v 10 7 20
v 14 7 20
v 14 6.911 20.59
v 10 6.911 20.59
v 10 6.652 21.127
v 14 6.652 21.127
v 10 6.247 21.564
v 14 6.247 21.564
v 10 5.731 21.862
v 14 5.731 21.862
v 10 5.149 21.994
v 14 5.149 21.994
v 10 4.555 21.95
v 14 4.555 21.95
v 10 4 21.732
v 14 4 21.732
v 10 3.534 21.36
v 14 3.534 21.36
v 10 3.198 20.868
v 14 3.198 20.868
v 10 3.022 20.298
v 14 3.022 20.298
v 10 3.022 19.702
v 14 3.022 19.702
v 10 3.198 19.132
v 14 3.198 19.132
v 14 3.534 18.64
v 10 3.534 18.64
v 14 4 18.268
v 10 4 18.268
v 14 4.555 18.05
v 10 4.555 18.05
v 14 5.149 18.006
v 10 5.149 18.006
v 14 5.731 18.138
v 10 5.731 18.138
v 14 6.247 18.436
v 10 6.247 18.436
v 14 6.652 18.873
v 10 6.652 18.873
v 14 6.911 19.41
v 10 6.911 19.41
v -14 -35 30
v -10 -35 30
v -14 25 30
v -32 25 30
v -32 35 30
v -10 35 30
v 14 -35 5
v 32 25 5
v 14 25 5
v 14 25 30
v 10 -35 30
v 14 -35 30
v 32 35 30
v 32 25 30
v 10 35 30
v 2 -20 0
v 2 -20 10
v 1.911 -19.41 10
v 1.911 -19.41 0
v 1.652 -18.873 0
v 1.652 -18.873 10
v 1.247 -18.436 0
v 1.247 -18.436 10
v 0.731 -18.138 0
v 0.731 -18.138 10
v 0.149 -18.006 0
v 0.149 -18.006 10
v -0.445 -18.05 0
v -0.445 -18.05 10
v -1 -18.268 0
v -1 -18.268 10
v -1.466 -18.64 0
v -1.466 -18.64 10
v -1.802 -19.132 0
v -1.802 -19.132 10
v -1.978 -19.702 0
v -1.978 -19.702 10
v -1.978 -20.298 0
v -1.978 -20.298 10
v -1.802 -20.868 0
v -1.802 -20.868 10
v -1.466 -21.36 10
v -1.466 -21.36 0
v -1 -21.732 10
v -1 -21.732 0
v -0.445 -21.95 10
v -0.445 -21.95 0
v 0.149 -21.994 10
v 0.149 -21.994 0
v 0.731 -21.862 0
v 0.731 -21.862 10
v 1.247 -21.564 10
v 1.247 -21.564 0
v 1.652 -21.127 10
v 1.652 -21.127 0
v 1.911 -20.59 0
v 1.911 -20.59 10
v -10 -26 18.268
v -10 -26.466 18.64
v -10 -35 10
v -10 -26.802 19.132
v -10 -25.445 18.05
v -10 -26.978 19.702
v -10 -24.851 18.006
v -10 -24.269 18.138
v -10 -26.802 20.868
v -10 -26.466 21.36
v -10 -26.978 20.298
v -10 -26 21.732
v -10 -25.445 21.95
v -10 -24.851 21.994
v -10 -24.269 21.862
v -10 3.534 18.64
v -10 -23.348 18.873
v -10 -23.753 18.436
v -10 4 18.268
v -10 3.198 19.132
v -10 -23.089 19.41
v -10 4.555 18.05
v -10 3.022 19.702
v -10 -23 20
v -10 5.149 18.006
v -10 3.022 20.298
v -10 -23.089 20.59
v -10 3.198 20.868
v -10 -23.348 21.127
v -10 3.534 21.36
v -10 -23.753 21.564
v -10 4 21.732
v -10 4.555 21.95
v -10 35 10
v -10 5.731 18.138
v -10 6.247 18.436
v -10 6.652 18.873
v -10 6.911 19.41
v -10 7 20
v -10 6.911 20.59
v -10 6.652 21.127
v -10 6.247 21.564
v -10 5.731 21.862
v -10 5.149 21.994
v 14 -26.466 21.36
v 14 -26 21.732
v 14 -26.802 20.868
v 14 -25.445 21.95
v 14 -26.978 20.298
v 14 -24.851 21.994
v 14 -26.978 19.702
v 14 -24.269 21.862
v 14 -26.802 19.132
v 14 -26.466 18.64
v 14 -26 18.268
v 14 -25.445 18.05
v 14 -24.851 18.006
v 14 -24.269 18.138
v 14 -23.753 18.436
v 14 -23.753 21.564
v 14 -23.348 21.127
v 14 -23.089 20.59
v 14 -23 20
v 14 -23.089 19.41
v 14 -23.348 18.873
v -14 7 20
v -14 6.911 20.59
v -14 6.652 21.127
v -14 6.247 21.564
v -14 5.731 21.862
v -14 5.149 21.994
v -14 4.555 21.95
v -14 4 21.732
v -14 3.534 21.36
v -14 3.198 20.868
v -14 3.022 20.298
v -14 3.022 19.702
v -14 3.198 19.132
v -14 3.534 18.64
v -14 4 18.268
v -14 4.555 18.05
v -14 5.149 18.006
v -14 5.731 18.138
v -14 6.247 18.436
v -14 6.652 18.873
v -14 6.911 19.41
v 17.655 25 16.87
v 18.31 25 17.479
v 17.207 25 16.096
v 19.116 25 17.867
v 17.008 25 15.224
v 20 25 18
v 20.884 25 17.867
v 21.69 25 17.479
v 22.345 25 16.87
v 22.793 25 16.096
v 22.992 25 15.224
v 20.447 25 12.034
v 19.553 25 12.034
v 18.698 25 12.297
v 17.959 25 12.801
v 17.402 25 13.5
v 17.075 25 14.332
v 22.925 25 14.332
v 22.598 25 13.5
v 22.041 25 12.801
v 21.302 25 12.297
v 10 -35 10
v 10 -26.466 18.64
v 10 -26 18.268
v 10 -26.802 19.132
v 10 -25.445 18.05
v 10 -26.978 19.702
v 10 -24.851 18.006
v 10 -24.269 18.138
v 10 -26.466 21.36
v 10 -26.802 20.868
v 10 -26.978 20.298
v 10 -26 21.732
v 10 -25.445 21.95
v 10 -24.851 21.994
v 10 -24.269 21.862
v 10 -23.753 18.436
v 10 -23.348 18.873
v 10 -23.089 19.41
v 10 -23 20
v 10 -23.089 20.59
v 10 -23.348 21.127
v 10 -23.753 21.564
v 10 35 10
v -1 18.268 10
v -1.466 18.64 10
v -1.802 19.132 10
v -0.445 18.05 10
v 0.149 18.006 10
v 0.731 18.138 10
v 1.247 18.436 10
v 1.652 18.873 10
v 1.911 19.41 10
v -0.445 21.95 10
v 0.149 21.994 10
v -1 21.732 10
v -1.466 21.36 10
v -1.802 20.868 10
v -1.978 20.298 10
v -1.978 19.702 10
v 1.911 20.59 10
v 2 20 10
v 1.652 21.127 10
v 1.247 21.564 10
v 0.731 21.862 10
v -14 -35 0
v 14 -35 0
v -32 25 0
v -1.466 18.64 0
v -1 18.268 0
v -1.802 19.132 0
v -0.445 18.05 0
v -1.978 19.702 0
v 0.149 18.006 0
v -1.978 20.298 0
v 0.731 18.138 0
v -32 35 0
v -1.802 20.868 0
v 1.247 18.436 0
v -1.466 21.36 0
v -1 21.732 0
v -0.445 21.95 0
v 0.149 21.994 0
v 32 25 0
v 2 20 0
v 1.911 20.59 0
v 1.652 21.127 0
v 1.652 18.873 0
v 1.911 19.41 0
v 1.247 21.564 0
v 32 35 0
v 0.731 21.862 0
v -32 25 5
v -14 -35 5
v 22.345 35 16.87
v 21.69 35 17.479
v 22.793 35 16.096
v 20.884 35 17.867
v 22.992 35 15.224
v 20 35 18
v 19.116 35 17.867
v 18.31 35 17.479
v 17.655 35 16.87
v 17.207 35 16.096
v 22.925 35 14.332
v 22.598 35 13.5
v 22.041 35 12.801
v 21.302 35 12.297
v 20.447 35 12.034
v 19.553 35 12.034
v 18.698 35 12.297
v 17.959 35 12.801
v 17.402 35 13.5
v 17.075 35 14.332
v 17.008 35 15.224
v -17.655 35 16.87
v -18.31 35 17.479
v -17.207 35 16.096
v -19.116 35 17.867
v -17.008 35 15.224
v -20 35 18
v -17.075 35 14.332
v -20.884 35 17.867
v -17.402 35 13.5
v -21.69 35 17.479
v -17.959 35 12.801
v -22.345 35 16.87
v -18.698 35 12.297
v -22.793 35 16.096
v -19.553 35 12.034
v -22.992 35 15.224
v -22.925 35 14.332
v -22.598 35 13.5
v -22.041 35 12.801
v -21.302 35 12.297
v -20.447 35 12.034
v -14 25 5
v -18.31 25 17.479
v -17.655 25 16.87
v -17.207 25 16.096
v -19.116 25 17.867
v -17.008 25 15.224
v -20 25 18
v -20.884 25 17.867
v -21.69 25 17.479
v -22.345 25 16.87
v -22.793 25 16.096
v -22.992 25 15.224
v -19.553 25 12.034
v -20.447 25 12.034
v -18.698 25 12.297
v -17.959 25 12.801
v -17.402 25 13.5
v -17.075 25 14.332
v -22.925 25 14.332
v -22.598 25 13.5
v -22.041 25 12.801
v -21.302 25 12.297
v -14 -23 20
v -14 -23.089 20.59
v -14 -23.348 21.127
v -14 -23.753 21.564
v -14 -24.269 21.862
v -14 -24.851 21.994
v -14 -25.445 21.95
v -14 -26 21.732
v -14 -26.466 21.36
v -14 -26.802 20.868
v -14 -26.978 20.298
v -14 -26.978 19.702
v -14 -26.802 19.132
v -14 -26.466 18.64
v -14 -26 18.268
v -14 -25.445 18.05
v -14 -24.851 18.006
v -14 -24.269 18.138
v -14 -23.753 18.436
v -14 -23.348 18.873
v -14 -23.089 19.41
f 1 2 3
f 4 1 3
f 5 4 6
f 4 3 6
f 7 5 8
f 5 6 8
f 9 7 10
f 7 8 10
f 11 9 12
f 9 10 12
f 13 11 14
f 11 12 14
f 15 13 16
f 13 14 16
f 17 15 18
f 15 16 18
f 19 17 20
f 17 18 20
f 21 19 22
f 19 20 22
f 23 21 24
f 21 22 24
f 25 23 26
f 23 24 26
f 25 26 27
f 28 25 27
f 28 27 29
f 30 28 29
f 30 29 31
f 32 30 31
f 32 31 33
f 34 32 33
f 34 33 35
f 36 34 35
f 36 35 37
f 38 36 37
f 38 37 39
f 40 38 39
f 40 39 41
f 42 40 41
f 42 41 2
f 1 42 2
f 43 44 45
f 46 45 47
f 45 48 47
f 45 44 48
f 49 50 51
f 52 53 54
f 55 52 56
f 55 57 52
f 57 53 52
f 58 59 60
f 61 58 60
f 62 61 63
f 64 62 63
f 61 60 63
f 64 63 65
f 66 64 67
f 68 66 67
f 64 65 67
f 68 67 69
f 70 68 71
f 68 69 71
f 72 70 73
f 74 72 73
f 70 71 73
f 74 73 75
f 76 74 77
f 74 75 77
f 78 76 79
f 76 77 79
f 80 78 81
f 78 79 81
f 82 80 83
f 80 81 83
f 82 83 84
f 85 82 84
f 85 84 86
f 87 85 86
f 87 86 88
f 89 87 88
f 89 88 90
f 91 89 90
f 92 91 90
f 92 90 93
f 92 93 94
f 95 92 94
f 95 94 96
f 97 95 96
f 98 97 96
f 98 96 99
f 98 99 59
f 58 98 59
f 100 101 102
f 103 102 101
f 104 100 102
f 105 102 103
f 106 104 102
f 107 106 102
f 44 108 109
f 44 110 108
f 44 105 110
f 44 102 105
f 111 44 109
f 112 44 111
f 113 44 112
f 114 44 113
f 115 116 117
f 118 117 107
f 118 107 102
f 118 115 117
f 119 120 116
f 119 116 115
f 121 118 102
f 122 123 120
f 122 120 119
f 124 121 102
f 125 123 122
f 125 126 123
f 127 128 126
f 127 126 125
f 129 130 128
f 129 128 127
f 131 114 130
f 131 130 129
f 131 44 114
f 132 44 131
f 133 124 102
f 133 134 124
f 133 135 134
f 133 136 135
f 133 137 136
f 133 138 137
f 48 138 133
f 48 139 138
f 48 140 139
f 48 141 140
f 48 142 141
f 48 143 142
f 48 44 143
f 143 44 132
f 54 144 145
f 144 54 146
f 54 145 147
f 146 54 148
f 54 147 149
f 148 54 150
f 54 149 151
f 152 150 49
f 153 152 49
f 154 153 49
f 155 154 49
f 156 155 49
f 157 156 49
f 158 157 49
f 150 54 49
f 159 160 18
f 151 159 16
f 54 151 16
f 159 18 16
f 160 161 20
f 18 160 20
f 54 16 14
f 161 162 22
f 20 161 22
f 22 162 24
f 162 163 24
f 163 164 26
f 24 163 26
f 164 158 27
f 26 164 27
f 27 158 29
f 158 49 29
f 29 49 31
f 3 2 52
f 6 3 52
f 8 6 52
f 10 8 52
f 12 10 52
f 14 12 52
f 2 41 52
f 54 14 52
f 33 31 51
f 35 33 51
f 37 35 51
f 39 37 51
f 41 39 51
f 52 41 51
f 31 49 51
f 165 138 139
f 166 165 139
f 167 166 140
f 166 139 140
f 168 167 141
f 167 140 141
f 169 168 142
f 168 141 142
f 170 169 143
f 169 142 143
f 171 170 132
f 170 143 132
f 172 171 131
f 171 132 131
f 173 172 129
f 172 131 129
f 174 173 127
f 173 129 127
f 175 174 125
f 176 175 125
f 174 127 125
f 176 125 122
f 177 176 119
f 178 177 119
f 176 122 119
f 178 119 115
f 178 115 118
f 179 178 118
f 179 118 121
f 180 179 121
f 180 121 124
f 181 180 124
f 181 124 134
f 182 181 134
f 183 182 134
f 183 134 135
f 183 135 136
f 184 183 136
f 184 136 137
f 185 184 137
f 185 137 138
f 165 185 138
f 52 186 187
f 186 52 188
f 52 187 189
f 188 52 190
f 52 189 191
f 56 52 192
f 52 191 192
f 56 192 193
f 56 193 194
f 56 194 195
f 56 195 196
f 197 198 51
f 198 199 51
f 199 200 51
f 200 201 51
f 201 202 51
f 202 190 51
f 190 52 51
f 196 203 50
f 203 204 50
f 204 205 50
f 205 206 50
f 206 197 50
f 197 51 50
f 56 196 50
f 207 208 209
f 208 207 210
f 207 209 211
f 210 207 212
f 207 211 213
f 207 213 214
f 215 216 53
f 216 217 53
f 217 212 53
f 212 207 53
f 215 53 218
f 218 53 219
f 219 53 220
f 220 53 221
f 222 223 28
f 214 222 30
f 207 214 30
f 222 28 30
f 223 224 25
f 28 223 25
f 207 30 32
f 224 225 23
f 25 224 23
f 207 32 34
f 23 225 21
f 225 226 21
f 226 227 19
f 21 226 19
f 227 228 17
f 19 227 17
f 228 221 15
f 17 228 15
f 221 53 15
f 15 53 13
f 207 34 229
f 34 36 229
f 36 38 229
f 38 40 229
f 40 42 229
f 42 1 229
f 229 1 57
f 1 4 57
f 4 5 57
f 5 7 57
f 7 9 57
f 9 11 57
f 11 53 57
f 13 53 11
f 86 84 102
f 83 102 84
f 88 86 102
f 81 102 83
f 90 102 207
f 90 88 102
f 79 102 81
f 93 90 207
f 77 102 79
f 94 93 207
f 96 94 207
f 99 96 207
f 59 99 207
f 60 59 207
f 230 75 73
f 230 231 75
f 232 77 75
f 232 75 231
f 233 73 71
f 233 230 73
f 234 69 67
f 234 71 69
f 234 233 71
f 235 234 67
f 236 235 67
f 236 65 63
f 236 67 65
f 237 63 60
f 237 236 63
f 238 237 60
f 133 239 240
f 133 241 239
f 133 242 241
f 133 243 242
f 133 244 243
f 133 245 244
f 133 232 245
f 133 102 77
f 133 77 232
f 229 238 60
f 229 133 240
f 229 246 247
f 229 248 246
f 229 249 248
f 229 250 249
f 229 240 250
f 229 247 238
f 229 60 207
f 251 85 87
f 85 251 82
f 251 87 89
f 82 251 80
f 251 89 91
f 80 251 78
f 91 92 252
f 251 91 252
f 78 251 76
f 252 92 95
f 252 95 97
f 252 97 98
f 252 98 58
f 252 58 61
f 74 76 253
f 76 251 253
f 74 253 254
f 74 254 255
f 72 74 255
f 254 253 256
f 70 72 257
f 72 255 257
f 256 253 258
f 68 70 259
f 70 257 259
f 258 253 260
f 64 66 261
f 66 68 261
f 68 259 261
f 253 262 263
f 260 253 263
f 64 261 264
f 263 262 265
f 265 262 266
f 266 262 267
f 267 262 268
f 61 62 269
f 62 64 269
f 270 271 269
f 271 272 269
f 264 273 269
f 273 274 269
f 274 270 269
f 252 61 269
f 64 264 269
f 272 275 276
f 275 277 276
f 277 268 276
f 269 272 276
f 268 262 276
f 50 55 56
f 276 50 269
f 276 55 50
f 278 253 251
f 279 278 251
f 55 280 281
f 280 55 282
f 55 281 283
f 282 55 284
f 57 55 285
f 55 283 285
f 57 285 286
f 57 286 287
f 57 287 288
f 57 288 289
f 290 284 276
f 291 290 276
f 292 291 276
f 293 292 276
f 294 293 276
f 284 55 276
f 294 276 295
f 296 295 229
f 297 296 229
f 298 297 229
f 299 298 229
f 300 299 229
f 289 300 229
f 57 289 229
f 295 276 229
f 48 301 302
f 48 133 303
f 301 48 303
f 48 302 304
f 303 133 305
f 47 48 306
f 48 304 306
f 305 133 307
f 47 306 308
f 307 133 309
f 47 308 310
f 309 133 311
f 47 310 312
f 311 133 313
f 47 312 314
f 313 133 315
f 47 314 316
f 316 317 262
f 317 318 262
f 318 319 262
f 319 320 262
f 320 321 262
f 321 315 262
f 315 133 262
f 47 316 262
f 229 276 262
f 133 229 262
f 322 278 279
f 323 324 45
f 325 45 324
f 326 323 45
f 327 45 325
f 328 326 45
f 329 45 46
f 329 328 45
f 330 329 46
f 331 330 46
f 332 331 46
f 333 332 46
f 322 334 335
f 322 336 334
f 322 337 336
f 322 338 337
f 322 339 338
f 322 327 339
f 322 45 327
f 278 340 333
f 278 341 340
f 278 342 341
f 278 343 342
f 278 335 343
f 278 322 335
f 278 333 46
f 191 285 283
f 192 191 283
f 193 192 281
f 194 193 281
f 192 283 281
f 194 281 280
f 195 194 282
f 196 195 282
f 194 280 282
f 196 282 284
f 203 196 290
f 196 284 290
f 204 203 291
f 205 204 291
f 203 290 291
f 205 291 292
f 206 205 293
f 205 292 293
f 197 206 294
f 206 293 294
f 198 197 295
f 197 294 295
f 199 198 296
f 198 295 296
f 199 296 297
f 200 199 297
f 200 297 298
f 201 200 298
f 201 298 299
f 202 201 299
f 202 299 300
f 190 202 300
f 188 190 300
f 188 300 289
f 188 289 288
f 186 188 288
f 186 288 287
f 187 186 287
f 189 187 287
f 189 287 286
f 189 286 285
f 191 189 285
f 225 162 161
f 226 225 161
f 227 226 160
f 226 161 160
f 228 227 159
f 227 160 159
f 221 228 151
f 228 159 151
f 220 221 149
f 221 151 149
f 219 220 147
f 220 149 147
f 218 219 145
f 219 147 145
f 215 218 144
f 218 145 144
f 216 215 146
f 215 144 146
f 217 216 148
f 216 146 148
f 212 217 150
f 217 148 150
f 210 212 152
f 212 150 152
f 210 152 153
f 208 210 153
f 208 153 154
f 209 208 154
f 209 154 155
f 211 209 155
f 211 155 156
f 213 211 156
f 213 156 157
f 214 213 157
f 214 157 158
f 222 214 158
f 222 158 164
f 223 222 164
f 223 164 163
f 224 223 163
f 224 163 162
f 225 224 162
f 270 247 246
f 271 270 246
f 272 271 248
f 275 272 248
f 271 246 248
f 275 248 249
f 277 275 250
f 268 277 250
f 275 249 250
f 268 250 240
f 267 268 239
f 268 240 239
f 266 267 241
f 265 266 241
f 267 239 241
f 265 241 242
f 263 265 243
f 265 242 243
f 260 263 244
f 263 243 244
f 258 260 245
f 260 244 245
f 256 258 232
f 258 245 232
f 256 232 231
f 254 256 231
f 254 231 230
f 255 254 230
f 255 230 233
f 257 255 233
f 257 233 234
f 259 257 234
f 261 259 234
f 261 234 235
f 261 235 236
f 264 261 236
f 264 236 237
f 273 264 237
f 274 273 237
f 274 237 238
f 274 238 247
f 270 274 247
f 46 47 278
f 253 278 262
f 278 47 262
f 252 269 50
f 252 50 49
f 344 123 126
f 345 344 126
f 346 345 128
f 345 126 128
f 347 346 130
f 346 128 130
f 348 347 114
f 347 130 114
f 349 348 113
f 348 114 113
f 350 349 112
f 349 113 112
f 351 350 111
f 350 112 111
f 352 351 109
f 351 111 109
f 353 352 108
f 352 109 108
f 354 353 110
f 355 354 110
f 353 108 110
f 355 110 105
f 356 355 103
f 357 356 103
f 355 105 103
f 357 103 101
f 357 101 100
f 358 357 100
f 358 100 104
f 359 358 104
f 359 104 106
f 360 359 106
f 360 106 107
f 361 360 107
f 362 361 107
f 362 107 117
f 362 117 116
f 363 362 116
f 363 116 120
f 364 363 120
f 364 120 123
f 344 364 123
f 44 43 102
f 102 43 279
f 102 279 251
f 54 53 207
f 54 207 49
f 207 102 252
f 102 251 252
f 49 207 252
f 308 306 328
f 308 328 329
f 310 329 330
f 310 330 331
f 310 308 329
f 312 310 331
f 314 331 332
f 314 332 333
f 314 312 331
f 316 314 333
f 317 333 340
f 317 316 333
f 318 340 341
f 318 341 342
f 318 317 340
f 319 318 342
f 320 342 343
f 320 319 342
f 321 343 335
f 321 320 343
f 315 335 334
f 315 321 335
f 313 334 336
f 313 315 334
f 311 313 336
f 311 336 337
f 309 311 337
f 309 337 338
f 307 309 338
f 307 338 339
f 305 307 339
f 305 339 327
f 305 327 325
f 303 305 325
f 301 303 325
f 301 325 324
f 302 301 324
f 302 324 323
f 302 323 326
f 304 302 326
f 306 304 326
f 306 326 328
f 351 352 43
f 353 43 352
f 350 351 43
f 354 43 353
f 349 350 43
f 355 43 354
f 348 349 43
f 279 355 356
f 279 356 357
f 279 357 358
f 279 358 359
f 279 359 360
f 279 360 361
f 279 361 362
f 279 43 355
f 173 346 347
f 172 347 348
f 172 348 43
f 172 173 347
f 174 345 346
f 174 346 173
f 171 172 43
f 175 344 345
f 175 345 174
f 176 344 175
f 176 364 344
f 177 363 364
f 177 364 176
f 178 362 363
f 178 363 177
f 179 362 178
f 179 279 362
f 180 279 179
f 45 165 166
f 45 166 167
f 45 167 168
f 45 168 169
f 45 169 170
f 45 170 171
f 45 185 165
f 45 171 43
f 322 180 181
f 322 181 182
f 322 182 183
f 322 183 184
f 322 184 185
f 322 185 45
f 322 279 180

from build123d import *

# Parameters (mm, degrees)
SKETCH_1_W          = 28
SKETCH_1_H          = 70
EXTRUDE_1_DEPTH     = 30
SKETCH_2_W          = 20
SKETCH_2_H          = 70
CUT_EXTRUDE_1_DEPTH = 20
SKETCH_4_W          = 18
SKETCH_4_H          = 30
EXTRUDE_2_DEPTH     = 10
SKETCH_5_R          = 3
CUT_EXTRUDE_2_DEPTH = 19
EXTRUDE_3_DEPTH     = 5
SKETCH_8_R          = 2
CUT_EXTRUDE_3_DEPTH = 98
SKETCH_9_R          = 2
CUT_EXTRUDE_4_DEPTH = 98


with BuildPart() as part:
    # 草图1 → 凸台-拉伸1 (new body)
    with BuildSketch(Plane.XY):
        Rectangle(SKETCH_1_W, SKETCH_1_H)
    extrude(amount=EXTRUDE_1_DEPTH)

    # 草图2 → 切除-拉伸1 (cut)
    with BuildSketch(Plane.XY.offset(30)):
        Rectangle(SKETCH_2_W, SKETCH_2_H)
    extrude(amount=-CUT_EXTRUDE_1_DEPTH, mode=Mode.SUBTRACT)

    # 草图4 → 凸台-拉伸2 (add)
    with BuildSketch(Plane(origin=(0, 35, 0), x_dir=(1, 0, 0), z_dir=(0, 1, 0))):
        with Locations((23, -15)):
            Rectangle(SKETCH_4_W, SKETCH_4_H)
    extrude(amount=-EXTRUDE_2_DEPTH)

    # 草图5 → 切除-拉伸2 (cut)
    with BuildSketch(Plane(origin=(0, 35, 0), x_dir=(1, 0, 0), z_dir=(0, 1, 0))):
        with Locations(Location((20, -15, 0), (0, 0, 270))):
            Circle(SKETCH_5_R)
    extrude(amount=-CUT_EXTRUDE_2_DEPTH, mode=Mode.SUBTRACT)

    # 草图7 → 凸台-拉伸3 (add)
    with BuildSketch(Plane(origin=(0, 0, 0), x_dir=(-1, 0, 0), z_dir=(0, 0, -1))):
        Polygon((-32, 25), (-14, -35), (-14, 25), align=None)
    extrude(amount=-EXTRUDE_3_DEPTH)

    # 镜向1: part across plane


with BuildPart() as part_1:
    add(part.part)
    add(part.part.mirror(Plane(origin=(0, 0, 0), x_dir=(0, 0, 1), z_dir=(1, 0, 0))))

    # 草图8 → 切除-拉伸3 (cut)
    with BuildSketch(Plane(origin=(14, 0, 0), x_dir=(0, 0, -1), z_dir=(1, 0, 0))):
        with Locations(Location((-20, -25, 0), (0, 0, 90))):
            Circle(SKETCH_8_R)
        with Locations(Location((-20, 5, 0), (0, 0, 90))):
            Circle(SKETCH_8_R)
    extrude(amount=-CUT_EXTRUDE_3_DEPTH, mode=Mode.SUBTRACT)

    # 草图9 → 切除-拉伸4 (cut)
    with BuildSketch(Plane.XY.offset(10)):
        with Locations((0, -20)):
            Circle(SKETCH_9_R)
        with Locations((0, 20)):
            Circle(SKETCH_9_R)
    extrude(amount=-CUT_EXTRUDE_4_DEPTH, mode=Mode.SUBTRACT)


solid = part_1.part
